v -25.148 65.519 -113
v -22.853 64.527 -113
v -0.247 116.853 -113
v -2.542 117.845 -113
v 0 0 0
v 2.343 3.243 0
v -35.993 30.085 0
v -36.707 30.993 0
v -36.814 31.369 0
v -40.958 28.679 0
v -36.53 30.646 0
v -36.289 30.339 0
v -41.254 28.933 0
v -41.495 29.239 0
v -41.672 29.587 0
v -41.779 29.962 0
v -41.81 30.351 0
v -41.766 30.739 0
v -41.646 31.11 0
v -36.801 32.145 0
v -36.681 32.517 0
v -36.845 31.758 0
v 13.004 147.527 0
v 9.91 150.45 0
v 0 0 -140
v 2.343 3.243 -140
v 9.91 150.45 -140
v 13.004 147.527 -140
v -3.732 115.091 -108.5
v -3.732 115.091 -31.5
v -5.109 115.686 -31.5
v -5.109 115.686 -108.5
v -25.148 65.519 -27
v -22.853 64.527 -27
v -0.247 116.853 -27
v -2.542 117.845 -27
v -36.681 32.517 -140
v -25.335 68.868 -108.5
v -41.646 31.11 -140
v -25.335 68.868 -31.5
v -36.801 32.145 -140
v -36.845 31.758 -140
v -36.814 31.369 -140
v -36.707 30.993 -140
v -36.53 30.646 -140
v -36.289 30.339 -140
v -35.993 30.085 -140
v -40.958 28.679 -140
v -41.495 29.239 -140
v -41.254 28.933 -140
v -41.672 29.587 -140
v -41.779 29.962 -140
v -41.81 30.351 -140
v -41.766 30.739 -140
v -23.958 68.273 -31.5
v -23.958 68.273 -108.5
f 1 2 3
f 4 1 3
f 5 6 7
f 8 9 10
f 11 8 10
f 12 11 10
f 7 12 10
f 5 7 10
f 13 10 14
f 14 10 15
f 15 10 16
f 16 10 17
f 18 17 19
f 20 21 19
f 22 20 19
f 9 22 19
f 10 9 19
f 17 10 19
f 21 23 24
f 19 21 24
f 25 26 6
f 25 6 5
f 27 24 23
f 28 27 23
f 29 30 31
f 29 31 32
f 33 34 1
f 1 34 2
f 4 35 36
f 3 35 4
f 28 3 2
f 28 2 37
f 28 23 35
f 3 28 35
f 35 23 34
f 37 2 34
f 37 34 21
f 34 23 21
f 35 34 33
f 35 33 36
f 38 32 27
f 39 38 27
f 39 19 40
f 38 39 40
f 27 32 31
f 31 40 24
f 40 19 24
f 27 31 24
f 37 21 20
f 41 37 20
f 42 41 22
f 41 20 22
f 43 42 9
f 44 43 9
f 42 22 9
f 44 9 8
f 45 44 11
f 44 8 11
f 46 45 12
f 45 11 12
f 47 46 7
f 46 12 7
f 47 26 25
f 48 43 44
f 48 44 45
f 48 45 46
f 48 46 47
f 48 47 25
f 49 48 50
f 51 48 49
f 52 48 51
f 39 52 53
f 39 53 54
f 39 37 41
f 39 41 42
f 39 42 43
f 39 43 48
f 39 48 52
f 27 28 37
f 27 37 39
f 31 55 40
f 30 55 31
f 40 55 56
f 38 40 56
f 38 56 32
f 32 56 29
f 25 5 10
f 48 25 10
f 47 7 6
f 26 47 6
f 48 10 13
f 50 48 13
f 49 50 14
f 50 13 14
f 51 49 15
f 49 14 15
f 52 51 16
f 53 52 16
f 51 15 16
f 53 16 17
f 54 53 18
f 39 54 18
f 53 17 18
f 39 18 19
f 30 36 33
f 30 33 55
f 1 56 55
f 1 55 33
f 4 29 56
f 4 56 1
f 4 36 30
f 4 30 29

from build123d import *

# Parameters (mm, degrees)
RESSALTO_EXTRUS_O1_DEPTH = 140
ESBO_O3_W                = 86
ESBO_O3_H                = 57
ESBO_O3_W_2              = 77
ESBO_O3_H_2              = 51
CORTE_EXTRUS_O1_DEPTH    = 2.5
ESBO_O4_W                = 77
ESBO_O4_H                = 51
CORTE_EXTRUS_O2_DEPTH    = 201.480317617
CORTE_EXTRUS_O3_DEPTH    = 210.721949933


with BuildPart() as part:
    # Esboço1 → Ressalto-extrusão1 (new body)
    with BuildSketch(Plane.XY):
        with BuildLine():
            Line((-41.646443714, 31.110299699), (9.909852794, 150.449933896))
            Line((9.909852794, 150.449933896), (13.581841538, 148.863586311))
            Line((13.581841538, 148.863586311), (-36.681468487, 32.516884972))
            ThreePointArc((-36.681468487, 32.516884972), (-36.769743597, 31.178562616), (-35.992626987, 30.085407091))
            Line((-35.992626987, 30.085407091), (2.342768013, 3.242674532))
            Line((2.342768013, 3.242674532), (0, 0))
            Line((0, 0), (-40.957602214, 28.678821818))
            ThreePointArc((-40.957602214, 28.678821818), (-41.734718825, 29.771977342), (-41.646443714, 31.110299699))
        make_face()
    extrude(amount=-RESSALTO_EXTRUS_O1_DEPTH)

    # Esboço3 → Corte-extrusão1 (cut)
    with BuildSketch(Plane(origin=(-42.750445362, 18.468756434, 0), x_dir=(0, 0, -1), z_dir=(0.9179971861354039, -0.39658689621252097, 0))):
        with Locations((70, 78.672876452)):
            Rectangle(ESBO_O3_W, ESBO_O3_H)
        with Locations((70, 78.672876452)):
            Rectangle(ESBO_O3_W_2, ESBO_O3_H_2, mode=Mode.SUBTRACT)
    extrude(amount=-CORTE_EXTRUS_O1_DEPTH, mode=Mode.SUBTRACT)

    # Esboço4 → Corte-extrusão2 (cut, through all)
    with BuildSketch(Plane(origin=(-42.750445362, 18.468756434, 0), x_dir=(0, 0, -1), z_dir=(0.9179971861354039, -0.39658689621252097, 0))):
        with Locations((70, 78.672876452)):
            Rectangle(ESBO_O4_W, ESBO_O4_H)
    extrude(amount=-CORTE_EXTRUS_O2_DEPTH, mode=Mode.SUBTRACT)

    # Esboço5 → Corte-extrusão3 (cut, through all)
    with BuildSketch(Plane.XY):
        Polygon((9.909852794, 150.449933896), (13.004458236, 147.527091708), (13.581841538, 148.863586311), align=None)
    extrude(amount=-CORTE_EXTRUS_O3_DEPTH, mode=Mode.SUBTRACT)


solid = part.part
